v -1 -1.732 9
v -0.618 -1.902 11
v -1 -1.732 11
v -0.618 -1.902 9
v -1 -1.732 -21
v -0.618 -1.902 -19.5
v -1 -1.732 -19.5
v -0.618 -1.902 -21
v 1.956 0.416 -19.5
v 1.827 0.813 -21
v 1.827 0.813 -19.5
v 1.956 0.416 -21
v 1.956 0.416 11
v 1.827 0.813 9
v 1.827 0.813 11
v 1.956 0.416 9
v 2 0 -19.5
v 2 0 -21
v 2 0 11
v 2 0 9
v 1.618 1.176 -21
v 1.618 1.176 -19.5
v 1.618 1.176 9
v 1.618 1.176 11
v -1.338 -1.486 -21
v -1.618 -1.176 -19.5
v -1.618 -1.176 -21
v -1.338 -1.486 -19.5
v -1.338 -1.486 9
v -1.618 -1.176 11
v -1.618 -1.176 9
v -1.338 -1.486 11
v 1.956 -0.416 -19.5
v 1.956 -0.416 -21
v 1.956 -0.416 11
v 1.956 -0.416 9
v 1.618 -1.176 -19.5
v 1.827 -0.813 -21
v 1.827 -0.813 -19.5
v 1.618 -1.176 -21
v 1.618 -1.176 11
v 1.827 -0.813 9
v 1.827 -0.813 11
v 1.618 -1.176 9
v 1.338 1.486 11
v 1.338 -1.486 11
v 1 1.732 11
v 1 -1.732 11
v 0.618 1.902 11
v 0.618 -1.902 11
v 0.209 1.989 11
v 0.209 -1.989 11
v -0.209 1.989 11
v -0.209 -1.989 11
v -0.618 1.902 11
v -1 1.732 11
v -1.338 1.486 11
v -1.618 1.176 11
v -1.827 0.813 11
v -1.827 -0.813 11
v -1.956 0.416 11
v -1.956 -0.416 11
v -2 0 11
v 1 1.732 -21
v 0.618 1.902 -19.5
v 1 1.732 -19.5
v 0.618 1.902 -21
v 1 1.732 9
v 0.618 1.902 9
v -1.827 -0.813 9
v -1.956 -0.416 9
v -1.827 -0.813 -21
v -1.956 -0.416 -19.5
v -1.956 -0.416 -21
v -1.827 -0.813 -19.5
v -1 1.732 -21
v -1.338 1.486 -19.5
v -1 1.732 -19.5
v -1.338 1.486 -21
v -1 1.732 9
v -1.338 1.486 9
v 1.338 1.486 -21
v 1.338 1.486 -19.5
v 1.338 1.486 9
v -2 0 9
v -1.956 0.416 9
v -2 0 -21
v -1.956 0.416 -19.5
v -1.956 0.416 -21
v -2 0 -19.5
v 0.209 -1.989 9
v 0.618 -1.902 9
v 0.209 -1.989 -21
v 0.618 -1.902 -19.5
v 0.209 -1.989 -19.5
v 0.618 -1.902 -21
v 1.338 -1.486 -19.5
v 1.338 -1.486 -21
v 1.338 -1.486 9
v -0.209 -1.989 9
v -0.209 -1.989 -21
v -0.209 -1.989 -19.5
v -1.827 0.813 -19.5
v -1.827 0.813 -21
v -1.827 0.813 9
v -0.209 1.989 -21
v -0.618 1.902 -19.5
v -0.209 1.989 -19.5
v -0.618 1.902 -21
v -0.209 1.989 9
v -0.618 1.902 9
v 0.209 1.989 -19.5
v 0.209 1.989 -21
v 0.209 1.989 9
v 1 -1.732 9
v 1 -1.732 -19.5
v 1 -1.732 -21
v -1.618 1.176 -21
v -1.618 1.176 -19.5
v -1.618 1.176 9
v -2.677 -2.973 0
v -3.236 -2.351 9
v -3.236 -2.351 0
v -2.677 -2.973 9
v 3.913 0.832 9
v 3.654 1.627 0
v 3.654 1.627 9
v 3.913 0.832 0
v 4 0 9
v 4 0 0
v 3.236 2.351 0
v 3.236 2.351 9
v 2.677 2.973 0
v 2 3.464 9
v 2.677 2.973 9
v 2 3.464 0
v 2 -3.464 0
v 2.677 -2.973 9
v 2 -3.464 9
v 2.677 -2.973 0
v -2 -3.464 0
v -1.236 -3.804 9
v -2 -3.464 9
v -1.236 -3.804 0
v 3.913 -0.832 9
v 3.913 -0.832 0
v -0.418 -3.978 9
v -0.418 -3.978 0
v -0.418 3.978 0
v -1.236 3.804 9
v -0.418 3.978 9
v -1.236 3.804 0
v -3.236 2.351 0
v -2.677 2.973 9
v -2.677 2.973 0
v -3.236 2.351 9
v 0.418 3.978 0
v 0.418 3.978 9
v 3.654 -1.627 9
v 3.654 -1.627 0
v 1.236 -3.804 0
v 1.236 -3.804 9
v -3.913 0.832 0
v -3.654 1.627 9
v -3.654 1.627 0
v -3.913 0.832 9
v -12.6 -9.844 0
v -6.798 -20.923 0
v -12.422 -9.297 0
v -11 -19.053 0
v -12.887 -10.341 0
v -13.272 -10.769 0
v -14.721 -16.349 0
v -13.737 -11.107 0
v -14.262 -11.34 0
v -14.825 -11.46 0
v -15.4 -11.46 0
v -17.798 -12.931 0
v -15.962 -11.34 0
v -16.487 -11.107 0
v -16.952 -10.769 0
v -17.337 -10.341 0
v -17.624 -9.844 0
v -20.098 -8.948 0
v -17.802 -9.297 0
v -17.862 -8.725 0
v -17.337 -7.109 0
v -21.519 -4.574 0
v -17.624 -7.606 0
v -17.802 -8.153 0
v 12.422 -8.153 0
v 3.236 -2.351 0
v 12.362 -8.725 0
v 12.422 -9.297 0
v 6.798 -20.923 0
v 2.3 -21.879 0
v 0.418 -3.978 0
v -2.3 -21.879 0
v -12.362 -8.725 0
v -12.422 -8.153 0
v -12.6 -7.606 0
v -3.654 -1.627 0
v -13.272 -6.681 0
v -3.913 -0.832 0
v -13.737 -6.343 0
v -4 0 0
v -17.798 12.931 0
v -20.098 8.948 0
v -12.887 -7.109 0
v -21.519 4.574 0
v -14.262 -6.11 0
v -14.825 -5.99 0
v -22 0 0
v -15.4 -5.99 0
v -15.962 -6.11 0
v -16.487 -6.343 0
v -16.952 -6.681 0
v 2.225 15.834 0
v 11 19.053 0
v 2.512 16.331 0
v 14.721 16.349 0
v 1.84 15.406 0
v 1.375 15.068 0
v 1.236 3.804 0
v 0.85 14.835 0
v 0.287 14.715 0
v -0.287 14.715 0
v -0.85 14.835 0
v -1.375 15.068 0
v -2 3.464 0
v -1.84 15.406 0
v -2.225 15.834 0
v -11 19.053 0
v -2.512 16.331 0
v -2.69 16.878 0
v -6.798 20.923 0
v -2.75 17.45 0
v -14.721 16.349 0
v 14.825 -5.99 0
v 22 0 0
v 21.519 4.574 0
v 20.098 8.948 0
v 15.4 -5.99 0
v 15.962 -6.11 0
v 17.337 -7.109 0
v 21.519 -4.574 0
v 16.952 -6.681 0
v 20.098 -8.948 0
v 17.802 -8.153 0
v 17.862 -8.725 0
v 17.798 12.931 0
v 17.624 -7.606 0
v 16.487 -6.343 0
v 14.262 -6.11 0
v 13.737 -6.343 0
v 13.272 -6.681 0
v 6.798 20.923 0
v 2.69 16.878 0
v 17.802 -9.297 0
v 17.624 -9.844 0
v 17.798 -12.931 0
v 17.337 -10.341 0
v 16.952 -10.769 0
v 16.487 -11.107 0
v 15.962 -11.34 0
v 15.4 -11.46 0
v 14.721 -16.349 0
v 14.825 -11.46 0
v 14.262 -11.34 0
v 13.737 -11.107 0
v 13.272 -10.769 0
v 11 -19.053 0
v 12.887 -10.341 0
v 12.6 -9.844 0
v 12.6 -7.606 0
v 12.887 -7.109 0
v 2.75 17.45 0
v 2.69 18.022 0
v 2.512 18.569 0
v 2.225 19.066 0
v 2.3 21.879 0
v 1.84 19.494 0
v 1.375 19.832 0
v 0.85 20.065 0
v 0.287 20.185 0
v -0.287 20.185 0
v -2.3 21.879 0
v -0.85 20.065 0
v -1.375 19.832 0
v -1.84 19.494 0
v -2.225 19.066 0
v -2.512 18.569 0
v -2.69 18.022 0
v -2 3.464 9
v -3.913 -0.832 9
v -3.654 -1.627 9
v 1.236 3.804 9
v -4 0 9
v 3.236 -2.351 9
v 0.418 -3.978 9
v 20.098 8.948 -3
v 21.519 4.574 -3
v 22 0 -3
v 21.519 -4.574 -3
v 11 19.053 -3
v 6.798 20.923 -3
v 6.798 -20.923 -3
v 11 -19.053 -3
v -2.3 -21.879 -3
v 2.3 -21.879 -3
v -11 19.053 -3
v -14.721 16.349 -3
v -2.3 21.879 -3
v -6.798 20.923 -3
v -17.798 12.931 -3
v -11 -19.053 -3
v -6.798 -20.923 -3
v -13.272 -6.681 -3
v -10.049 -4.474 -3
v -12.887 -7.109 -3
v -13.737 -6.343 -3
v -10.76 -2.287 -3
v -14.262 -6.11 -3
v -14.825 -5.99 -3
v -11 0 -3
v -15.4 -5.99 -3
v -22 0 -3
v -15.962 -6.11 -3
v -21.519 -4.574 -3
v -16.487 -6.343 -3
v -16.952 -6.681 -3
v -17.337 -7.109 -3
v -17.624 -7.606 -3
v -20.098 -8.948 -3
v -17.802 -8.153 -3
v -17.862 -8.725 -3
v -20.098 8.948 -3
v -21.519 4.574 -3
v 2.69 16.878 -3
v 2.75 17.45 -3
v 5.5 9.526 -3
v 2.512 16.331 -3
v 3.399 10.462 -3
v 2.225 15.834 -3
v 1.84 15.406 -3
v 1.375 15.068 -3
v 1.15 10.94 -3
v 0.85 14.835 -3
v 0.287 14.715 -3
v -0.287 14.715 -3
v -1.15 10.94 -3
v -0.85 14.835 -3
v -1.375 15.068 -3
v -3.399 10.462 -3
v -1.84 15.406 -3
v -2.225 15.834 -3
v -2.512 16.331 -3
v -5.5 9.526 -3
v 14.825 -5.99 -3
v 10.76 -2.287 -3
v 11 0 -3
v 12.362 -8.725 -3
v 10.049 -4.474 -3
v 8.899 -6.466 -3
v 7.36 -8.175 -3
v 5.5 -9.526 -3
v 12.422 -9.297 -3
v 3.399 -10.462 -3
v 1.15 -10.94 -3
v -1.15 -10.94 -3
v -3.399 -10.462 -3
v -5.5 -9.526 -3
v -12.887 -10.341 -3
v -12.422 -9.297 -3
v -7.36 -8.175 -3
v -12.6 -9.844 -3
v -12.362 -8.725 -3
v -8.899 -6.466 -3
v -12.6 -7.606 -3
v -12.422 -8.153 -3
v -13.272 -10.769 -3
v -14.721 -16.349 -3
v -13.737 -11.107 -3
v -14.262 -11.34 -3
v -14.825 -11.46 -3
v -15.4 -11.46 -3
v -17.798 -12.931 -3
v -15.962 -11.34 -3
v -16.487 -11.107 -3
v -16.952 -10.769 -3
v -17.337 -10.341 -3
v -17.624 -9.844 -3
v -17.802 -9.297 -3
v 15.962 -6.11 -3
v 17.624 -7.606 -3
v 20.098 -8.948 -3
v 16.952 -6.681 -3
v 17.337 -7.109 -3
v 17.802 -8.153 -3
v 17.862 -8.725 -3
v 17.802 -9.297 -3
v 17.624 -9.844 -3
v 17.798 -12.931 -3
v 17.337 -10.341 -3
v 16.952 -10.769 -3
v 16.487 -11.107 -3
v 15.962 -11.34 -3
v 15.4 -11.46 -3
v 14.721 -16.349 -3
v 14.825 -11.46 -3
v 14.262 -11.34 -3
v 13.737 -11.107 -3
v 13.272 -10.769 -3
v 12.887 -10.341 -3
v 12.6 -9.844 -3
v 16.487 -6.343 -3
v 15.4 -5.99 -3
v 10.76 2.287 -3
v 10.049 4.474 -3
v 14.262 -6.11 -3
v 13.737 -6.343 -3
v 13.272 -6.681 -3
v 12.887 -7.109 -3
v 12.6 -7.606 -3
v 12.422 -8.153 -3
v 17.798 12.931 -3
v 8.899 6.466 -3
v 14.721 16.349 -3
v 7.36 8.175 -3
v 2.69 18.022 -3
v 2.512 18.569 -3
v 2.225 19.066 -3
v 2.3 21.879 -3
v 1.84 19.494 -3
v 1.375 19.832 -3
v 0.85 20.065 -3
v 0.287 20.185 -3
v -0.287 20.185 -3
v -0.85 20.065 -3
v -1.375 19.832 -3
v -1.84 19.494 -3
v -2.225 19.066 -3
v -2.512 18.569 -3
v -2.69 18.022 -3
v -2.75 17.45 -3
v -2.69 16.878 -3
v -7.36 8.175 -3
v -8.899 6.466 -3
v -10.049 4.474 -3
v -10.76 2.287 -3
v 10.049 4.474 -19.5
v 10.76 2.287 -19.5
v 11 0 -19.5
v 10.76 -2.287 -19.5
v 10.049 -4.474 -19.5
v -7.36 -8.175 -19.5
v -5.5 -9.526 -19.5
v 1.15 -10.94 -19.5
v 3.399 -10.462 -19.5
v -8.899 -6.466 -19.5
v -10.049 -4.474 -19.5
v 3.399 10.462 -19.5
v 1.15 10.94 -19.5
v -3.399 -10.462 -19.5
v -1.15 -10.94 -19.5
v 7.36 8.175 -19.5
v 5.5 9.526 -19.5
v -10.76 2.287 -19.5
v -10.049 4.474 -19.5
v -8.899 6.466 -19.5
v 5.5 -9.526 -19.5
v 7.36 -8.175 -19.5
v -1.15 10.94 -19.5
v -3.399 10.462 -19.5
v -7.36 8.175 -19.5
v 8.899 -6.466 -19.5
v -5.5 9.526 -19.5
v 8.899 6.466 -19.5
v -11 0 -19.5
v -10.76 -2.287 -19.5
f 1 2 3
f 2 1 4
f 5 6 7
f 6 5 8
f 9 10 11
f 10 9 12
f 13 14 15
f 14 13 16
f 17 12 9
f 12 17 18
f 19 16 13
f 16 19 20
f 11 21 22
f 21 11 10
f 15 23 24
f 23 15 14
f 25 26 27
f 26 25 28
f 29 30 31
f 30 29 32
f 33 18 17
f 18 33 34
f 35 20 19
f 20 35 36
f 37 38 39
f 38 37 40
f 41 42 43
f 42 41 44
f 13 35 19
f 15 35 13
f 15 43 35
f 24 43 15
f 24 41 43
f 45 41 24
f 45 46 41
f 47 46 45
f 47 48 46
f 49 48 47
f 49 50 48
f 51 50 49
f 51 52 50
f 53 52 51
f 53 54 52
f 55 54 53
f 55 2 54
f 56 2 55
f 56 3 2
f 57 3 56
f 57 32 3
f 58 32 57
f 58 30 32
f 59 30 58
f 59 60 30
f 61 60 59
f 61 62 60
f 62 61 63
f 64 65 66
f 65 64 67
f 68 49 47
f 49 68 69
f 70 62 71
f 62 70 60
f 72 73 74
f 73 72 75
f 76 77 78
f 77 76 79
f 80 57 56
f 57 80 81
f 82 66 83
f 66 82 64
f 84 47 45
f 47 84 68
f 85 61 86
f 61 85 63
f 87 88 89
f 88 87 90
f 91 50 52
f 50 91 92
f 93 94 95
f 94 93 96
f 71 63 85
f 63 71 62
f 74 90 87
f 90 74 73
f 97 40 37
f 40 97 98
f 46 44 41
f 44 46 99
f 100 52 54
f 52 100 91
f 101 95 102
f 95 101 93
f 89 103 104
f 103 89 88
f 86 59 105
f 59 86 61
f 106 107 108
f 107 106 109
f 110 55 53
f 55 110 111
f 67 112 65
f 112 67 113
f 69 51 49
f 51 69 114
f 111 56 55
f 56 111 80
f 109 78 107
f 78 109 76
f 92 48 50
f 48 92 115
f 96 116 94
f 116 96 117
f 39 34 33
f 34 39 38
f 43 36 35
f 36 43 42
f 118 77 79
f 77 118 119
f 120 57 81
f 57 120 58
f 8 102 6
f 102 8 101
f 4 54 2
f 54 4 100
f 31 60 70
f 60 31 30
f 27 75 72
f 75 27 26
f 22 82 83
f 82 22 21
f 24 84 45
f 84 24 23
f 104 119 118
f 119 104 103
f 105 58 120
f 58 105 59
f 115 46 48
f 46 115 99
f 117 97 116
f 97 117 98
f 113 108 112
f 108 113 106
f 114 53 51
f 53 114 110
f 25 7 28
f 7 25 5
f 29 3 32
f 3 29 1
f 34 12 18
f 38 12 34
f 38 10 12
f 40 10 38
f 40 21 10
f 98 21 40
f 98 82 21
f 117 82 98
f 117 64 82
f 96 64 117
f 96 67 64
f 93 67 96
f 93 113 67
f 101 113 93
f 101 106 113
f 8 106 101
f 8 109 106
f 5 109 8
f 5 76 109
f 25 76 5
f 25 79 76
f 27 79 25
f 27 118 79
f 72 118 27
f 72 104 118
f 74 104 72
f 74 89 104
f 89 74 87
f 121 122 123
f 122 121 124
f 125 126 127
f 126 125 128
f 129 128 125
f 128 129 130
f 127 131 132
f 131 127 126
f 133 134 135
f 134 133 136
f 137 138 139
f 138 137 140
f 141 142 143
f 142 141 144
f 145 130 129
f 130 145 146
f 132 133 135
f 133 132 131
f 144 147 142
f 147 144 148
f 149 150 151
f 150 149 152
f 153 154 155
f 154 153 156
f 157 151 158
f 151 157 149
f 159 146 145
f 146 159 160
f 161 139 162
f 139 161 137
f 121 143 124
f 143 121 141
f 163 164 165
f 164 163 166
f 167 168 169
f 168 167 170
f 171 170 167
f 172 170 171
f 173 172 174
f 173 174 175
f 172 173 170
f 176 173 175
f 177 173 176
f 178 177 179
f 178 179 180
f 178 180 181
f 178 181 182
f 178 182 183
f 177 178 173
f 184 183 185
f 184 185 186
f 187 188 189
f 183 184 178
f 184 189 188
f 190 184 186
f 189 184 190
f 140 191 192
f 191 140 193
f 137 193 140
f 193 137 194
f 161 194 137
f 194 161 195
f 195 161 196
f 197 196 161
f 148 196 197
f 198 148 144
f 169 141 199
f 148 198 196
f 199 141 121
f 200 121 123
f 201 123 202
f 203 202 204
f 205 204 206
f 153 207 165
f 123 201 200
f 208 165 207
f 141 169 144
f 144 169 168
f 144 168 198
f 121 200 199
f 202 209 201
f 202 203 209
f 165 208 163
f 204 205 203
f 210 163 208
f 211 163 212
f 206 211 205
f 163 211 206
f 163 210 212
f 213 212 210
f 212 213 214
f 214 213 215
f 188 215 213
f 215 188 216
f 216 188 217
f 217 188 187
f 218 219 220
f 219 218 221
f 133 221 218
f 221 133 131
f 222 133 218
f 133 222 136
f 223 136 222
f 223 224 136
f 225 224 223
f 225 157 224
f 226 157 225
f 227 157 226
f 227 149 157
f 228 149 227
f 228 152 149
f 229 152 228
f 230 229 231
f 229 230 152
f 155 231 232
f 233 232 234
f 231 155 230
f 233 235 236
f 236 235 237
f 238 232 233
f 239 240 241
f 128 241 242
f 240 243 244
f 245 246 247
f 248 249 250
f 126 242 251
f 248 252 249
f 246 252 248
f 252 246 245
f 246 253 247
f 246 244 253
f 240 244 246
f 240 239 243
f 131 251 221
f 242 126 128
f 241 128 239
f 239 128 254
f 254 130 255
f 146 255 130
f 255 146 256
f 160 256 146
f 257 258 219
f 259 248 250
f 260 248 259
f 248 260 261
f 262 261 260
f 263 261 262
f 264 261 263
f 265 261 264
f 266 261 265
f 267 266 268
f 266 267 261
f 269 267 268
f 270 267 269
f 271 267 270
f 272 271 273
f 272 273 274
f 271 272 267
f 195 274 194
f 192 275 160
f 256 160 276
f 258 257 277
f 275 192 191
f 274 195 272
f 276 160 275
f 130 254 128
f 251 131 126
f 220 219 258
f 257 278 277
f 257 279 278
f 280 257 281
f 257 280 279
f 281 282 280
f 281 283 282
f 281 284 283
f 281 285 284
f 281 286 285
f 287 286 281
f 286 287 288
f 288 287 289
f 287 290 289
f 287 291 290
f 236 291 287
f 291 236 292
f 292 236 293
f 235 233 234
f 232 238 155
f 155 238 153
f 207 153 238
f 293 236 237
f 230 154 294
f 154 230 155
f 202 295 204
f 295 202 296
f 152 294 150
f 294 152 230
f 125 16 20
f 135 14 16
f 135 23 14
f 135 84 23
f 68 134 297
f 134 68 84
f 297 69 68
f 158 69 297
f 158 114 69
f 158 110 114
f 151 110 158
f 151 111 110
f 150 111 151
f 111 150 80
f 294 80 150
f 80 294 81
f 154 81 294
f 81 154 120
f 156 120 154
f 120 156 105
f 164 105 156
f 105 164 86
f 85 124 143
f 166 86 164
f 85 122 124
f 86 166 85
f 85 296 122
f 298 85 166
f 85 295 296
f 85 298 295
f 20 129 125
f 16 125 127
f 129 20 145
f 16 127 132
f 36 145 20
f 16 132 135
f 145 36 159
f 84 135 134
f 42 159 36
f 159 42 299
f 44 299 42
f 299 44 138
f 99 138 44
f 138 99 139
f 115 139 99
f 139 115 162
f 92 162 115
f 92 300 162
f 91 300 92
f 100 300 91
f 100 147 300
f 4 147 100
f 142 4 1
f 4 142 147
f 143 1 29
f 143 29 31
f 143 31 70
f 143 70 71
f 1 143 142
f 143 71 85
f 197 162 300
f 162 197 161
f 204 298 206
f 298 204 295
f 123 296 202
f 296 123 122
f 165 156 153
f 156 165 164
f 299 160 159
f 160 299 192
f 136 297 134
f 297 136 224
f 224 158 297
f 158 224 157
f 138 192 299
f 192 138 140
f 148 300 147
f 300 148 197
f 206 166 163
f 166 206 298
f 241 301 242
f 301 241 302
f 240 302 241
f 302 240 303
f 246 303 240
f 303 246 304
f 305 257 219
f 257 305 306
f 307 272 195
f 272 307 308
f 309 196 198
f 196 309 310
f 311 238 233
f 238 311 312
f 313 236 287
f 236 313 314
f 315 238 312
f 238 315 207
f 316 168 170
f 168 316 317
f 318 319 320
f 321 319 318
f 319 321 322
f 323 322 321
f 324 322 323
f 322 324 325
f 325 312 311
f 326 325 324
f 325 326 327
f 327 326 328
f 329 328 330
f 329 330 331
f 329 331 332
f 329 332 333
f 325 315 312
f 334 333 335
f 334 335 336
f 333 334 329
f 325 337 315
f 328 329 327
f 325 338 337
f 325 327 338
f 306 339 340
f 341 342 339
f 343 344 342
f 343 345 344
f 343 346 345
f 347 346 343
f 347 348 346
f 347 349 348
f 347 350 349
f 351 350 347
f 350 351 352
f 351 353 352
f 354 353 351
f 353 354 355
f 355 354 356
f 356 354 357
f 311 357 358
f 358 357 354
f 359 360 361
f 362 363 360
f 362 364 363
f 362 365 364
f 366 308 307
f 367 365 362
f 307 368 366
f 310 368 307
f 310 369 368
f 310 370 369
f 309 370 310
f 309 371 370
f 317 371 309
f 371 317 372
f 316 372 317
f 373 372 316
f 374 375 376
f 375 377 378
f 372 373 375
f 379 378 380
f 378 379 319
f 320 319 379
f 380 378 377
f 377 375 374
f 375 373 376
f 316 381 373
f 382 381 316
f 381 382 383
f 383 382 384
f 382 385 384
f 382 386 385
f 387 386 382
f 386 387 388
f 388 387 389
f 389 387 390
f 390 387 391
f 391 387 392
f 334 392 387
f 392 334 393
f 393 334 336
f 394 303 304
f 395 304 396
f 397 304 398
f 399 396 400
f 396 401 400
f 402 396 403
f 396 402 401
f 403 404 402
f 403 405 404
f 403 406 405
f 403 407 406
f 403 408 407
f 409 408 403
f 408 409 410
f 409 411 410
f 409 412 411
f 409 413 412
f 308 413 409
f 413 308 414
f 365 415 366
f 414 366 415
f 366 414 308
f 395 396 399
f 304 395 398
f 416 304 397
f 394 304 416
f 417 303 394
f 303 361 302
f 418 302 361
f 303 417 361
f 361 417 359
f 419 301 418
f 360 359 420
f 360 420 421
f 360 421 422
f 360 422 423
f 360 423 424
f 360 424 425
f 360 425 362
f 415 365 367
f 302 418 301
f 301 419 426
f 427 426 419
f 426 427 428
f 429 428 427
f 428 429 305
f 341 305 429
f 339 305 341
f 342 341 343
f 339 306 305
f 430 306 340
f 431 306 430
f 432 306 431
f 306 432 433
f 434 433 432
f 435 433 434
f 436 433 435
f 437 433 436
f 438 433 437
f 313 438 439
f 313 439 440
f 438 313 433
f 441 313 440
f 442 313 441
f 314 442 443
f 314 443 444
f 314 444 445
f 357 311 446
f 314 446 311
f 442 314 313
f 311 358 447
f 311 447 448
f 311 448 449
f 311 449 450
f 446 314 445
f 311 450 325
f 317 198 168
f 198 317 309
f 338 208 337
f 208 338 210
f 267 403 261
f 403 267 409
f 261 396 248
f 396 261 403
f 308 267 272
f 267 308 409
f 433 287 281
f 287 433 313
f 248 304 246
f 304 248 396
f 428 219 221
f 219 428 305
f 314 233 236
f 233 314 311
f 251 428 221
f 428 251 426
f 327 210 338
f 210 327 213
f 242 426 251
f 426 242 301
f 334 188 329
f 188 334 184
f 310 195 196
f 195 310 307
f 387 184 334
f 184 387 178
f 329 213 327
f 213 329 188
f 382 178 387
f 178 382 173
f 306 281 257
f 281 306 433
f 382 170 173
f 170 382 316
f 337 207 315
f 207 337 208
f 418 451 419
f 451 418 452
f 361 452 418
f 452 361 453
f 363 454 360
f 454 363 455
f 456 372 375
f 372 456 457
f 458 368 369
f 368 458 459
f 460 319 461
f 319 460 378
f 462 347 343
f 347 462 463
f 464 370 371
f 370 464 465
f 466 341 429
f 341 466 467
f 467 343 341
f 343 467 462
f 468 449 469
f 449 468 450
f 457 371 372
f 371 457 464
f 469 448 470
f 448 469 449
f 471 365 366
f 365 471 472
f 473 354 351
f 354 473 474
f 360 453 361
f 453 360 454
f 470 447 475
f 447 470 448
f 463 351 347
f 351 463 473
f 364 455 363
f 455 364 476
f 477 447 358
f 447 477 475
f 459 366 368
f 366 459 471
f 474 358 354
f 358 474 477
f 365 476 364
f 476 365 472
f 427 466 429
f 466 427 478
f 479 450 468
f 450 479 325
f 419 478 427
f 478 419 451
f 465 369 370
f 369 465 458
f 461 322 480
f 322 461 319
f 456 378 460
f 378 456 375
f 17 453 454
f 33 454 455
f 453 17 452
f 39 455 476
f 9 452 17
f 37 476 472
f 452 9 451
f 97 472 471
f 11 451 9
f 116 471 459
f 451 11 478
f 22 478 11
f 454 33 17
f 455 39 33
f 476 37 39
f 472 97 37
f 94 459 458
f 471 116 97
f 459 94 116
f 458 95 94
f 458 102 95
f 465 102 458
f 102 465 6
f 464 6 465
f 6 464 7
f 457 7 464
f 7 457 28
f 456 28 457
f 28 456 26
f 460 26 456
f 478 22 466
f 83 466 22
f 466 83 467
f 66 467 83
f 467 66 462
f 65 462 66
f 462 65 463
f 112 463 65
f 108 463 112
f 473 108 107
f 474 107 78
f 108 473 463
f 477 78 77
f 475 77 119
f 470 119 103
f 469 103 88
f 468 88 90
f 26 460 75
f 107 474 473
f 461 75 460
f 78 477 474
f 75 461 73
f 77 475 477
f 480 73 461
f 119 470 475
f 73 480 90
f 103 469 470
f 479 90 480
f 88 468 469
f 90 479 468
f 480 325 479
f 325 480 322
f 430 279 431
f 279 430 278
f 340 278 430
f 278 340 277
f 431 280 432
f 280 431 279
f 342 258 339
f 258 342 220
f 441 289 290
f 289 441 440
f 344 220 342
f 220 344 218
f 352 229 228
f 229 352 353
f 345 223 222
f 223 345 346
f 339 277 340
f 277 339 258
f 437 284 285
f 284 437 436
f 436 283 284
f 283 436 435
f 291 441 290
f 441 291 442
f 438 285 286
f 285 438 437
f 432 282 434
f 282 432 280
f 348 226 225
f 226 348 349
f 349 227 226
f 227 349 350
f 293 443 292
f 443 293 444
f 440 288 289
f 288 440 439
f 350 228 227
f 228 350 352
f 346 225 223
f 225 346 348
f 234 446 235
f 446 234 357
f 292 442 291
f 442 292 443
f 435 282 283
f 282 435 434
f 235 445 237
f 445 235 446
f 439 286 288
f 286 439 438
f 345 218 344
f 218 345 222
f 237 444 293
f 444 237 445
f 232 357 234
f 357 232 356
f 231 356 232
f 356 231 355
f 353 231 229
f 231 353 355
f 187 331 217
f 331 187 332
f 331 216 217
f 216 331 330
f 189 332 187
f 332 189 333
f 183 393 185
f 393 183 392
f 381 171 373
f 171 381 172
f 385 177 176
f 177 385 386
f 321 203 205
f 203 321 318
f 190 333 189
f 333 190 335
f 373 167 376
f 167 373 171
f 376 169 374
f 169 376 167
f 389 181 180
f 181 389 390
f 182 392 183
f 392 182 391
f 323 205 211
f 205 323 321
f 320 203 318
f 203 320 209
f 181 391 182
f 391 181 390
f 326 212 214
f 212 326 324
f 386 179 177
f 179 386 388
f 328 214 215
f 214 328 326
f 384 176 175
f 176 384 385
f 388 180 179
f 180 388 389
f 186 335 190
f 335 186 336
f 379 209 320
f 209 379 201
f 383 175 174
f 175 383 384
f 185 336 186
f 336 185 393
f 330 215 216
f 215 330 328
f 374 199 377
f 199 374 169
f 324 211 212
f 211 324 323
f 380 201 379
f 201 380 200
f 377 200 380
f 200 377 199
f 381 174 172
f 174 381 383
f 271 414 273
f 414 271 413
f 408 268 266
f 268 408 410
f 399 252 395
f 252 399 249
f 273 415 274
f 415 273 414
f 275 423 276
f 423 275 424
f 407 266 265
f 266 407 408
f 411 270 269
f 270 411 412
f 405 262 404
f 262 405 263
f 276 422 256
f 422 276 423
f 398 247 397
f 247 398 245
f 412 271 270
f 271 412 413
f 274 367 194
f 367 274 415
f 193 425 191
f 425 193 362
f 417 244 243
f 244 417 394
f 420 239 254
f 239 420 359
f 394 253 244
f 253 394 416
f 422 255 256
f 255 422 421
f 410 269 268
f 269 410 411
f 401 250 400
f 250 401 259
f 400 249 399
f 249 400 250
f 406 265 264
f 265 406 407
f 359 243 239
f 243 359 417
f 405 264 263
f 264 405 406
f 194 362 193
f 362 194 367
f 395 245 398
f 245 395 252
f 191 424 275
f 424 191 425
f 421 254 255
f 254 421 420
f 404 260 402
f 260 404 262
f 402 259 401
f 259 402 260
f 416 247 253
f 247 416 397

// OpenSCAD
// file: ../settings.scad
// Common settings used by all scad files.

// ALL UNITS IN MILLIMETERS (MM)!!!

$fn = 30;//low-res but fast to render
//$fn = 50;//higher-res but slow to render

pi = 3.1415926535897932384626433832795;

max_footprint = 150; // 15x15 cm

bottom_clearance = 10;
bottom_clearance = 25.4/2+10;
//bottom_clearance = 30;

shell_alpha = 0.215;
//shell_alpha = 1.0;

tolerance = 0.5;

// Flat countersunk M2.5mm x 0.45mm machine screw.
screw_thread_diameter = 2.5;//2.8;//2.75;//2.4?
screw_thread_length = 5;//?
screw_head_diameter = 4.75; // M2.5
//screw_head_diameter = 5.2; // M3
screw_head_height = 1.5;//2;

screw_thread_diameter2 = 2;

unit_thickness = 5;
u = unit_thickness;

shell_thickness = unit_thickness;

// Show flags.
show_platform = 0;
show_head = 1;
show_head_shell = 0;
show_head_electronics_bb = 0;
show_battery = 1;
show_foot_cube = 0;
show_torso = 0;
show_motor = 0;
show_motor_plates = 1;
show_motor_inner_plates = 1;
show_motor_outer_plates = 1;
show_wheel = 0;//obsolete
show_tracks = 1;//
show_track_wheels = 1;
show_caster = 0;
show_rpi = 1;
show_vertical_plates = 1;//
show_horizontal_plates = 1;//
show_caster_plates = 0;//obsolete?
show_camera = 1;
show_screen = 0;
show_edge_mount = 1;
show_sonar_mount = 1;
show_recharge_mount = 1;
show_conduit = 1;
show_torso_shell = 1;
show_recharge_dock = 0;
show_head_tilt_axis = 0;
show_rpi_camera_axis = 0;
show_laser_axis = 0;

head_vertical_angle_tilt = 0;
//head_vertical_angle_tilt = 30;//max
//head_vertical_angle_tilt = 10;

torso_height = 120+20;

base_plate_diameter = max_footprint-unit_thickness*2;
base_plate_frame = 0;

head_height = 50;
head_offset_z = max_footprint/2;
head_middle_cutout = 85;

rpi_with_four_hats_and_clearance = 76;

qrd1114_w = 6.10;
qrd1114_l = 4.39;
qrd1114_h = 4.65;

dock_radius = 10;
dock_gripper_border = 2;
dock_gripper_instep = 0.9;
dock_gripper_cutout_tapper = 50;
dock_receiver_height = 5;

// Patriod Fuel+ 9000 mAh
battery_length = 90;
battery_width = 57;
battery_height = 23;
battery_offset_z = 30;//4;

wheel_diameter = 50;
wheel_offset_x = 65;
wheel_offset_z = wheel_diameter/2;
wheel_axle_diameter = 5;

//caster_diameter = 19.05; // 0.75 inches
caster_diameter = 25.45; // 1 inches
//caster_diameter = 15.875; // 5/8 inches
caster_holder_diameter = 30;//31;
caster_offset_y = base_plate_diameter/2 - caster_holder_diameter/2;

arduino_offset_x = 0;
arduino_offset_y = 0;
arduino_offset_z = 67;
arduino_offset_x2 = 0;
arduino_offset_y2 = -20;
arduino_offset_z2 = torso_height+bottom_clearance;

horizontal_plate_width = unit_thickness*8*2 - unit_thickness*2;
horizontal_plate_depth = unit_thickness*8*2;

vertical_plate_width = horizontal_plate_depth;
vertical_plate_height = unit_thickness*8;
vertical_plate_offset_x = wheel_offset_x-22.5;
vertical_plate_offset_z = vertical_plate_height/2 + unit_thickness/2;

vertical_battery_plate_height = 100 - 15;

caster_plate_width = horizontal_plate_width + unit_thickness*2;
caster_plate_mount_length = unit_thickness*4;
caster_plate_width_minor = caster_holder_diameter;

motor_switch_length = 20;
motor_switch_thickness = 6.5;
motor_switch_height = 11;
motor_switch_height_leads = 23;
motor_switch_on_height =  13.3;
motor_switch_hole_diameter = 2.5;
motor_switch_hole_offset_z = 6.5;//this plus diameter/2 is hole center from switch top
motor_switch_hole_spacing = 7.1;// holes are diameter/2 from this

motor_length = 60;
motor_width = 25;
motor_collar_width = 7;
motor_collar_height = 2.5;
motor_axle_width = 4;
motor_axle_height = 9.5;
motor_offset_x = 10;
//motor_offset_y = motor_width/2+5;
motor_offset_y = unit_thickness*3.5;
motor_offset_z = vertical_plate_height/2 - unit_thickness/2;//4;//30;
motor_mount_holes_dist = 17;
// motor countersink hole
motor_mount_holes_width = 3; // M3
motor_mount_holes_head_height = 2.2;
motor_mount_holes_head_width = 5.8;
motor_bearing_outer_diameter = 10;
motor_bearing_inner_diameter = 5.95;
motor_bearing_thickness = 2.5;

motor_unimount_idler_axle_d = screw_thread_diameter;
//motor_unimount_spacer_depth = 0.1;//too small
motor_unimount_spacer_depth = 0.5;

motor_arm_offset_y = -u*3;
motor_arm_offset_z = u*.5;

motor_plate_width = vertical_plate_width;
motor_plate_height = vertical_plate_height;
motor_plate_thickness = unit_thickness;
motor_plate_offset_z = vertical_plate_offset_z;

motor_plate_middle_thickness = 5;

wheel_hub_offset = u*3;

motor_hole_height_offset = -5;

nylon_spacer_outer_diameter = 6.35;
nylon_spacer_inner_diameter = 3.302;
nylon_spacer_length = 12.7;

track_width = unit_thickness*3;
track_offset_x = -50;
track_offset_z = .1;
//track_wheel_radius = 19;//original
track_wheel_radius = 14;
//track_wheel_hole_radius = (nylon_spacer_outer_diameter+1)/2;
track_wheel_hole_radius = motor_bearing_outer_diameter/2;

track_driver_hole_radius = (motor_axle_width)/2 + 0.1;
track_driver_set_screw_head_d = 4.1;
track_driver_set_screw_shaft_d = 2.4;
//track_wheel_width = 13.5;//original
track_wheel_width = u*2;
track_wheel_width_buffer = u*0.25;
track_offset = 3;        //distance from chassis
track_wheel_offset = track_offset;
//track_length = 250; // see tread_triangle.py, too big
//track_length = 240; // see tread_triangle.py
//track_length = 238; //inc/dec in 10 unit increments so notches match idlers
track_length = 228; //inc/dec in 10 unit increments so notches match idlers
track_radius = track_length/2/pi;
track_wheel_show_fancy = 1;
track_wheel_gap = track_wheel_width + track_wheel_width_buffer*2;
track_axle_bearing_diameter = motor_bearing_inner_diameter - 0.1;
track_tensioner_radius = 12;
track_nut_height = 3.5; //TODO
track_punchout_thickness = 0.25;//should be the same as the minimum layer thickness

head_slew_bearing_outer_diameter = 115;
head_slew_bearing_ring_thickness = 20;
head_slew_bearing_inner_diameter = head_slew_bearing_outer_diameter - head_slew_bearing_ring_thickness;
//head_slew_bearing_hole_diameter = head_slew_bearing_inner_diameter - head_slew_bearing_ring_thickness;
head_slew_bearing_hole_diameter = 12+tolerance; // slip ring https://www.adafruit.com/products/775
//head_slew_bearing_ball_diameter = 5;
head_slew_bearing_ball_diameter = 2.5; //u/2;
head_slew_bearing_height = u;//head_slew_bearing_ball_diameter*2;
head_slew_bearing_gap = 0.5;
head_slew_bearing_slew_gap = 0;
head_slew_bearing_gap_factor = 0.1;

neck_strut_width = u*7;
neck_strut_height = u*18;
neck_strut_spacing = u*8;

show_outer_race = 0;
show_inner_race_a = 1;
show_inner_race_b = 1;
show_balls = 0;
// main file
include <../settings.scad>;

module make_slipring_736(){
    //https://www.adafruit.com/products/736
    //6 wiries
	total_height_with_wires = 32;
	flange_d = 44;
	hole_d = 5.5;
	difference(){
	    union(){
			//top wires
			translate([0,0,-total_height_with_wires+9+2])
			cylinder(h=total_height_with_wires, d=4, center=false);
			//top thin
			cylinder(h=9, d=8, center=false);
			//middle flange
			translate([0,0,-3])
			cylinder(h=3, d=flange_d, center=false);
			//bottom fat
			translate([0,0,-19.5])
			cylinder(d=22, h=19.5, center=false);
		}
		for(i=[0:2]){
			rotate([0,0,120*i])
			translate([0,flange_d/2-hole_d/2-1.8,0])
			cylinder(d=hole_d, h=50, center=true);
		}
	}
}

module make_slipring_775(){
    //https://www.adafruit.com/products/775
    //6 wiries
    cylinder(h=17, d=12);
}

module make_slipring_1196(){
    //https://www.adafruit.com/products/1196
    total_height_with_wires = 32;
    flange_d = 44;
    hole_d = 5.5;
    difference(){
        union(){
            //top wires
            translate([0,0,-total_height_with_wires+9+2])
            cylinder(h=total_height_with_wires, d=4, center=false);
            //top thin
            cylinder(h=9, d=8, center=false);
            //middle flange
            translate([0,0,-3])
            cylinder(h=3, d=flange_d, center=false);
            //bottom fat
            translate([0,0,-19.5])
            cylinder(d=22, h=19.5, center=false);
        }
        for(i=[0:2]){
            rotate([0,0,120*i])
            translate([0,flange_d/2-hole_d/2-1.8,0])
            cylinder(d=hole_d, h=50, center=true);
        }
    }
}

make_slipring_736();
